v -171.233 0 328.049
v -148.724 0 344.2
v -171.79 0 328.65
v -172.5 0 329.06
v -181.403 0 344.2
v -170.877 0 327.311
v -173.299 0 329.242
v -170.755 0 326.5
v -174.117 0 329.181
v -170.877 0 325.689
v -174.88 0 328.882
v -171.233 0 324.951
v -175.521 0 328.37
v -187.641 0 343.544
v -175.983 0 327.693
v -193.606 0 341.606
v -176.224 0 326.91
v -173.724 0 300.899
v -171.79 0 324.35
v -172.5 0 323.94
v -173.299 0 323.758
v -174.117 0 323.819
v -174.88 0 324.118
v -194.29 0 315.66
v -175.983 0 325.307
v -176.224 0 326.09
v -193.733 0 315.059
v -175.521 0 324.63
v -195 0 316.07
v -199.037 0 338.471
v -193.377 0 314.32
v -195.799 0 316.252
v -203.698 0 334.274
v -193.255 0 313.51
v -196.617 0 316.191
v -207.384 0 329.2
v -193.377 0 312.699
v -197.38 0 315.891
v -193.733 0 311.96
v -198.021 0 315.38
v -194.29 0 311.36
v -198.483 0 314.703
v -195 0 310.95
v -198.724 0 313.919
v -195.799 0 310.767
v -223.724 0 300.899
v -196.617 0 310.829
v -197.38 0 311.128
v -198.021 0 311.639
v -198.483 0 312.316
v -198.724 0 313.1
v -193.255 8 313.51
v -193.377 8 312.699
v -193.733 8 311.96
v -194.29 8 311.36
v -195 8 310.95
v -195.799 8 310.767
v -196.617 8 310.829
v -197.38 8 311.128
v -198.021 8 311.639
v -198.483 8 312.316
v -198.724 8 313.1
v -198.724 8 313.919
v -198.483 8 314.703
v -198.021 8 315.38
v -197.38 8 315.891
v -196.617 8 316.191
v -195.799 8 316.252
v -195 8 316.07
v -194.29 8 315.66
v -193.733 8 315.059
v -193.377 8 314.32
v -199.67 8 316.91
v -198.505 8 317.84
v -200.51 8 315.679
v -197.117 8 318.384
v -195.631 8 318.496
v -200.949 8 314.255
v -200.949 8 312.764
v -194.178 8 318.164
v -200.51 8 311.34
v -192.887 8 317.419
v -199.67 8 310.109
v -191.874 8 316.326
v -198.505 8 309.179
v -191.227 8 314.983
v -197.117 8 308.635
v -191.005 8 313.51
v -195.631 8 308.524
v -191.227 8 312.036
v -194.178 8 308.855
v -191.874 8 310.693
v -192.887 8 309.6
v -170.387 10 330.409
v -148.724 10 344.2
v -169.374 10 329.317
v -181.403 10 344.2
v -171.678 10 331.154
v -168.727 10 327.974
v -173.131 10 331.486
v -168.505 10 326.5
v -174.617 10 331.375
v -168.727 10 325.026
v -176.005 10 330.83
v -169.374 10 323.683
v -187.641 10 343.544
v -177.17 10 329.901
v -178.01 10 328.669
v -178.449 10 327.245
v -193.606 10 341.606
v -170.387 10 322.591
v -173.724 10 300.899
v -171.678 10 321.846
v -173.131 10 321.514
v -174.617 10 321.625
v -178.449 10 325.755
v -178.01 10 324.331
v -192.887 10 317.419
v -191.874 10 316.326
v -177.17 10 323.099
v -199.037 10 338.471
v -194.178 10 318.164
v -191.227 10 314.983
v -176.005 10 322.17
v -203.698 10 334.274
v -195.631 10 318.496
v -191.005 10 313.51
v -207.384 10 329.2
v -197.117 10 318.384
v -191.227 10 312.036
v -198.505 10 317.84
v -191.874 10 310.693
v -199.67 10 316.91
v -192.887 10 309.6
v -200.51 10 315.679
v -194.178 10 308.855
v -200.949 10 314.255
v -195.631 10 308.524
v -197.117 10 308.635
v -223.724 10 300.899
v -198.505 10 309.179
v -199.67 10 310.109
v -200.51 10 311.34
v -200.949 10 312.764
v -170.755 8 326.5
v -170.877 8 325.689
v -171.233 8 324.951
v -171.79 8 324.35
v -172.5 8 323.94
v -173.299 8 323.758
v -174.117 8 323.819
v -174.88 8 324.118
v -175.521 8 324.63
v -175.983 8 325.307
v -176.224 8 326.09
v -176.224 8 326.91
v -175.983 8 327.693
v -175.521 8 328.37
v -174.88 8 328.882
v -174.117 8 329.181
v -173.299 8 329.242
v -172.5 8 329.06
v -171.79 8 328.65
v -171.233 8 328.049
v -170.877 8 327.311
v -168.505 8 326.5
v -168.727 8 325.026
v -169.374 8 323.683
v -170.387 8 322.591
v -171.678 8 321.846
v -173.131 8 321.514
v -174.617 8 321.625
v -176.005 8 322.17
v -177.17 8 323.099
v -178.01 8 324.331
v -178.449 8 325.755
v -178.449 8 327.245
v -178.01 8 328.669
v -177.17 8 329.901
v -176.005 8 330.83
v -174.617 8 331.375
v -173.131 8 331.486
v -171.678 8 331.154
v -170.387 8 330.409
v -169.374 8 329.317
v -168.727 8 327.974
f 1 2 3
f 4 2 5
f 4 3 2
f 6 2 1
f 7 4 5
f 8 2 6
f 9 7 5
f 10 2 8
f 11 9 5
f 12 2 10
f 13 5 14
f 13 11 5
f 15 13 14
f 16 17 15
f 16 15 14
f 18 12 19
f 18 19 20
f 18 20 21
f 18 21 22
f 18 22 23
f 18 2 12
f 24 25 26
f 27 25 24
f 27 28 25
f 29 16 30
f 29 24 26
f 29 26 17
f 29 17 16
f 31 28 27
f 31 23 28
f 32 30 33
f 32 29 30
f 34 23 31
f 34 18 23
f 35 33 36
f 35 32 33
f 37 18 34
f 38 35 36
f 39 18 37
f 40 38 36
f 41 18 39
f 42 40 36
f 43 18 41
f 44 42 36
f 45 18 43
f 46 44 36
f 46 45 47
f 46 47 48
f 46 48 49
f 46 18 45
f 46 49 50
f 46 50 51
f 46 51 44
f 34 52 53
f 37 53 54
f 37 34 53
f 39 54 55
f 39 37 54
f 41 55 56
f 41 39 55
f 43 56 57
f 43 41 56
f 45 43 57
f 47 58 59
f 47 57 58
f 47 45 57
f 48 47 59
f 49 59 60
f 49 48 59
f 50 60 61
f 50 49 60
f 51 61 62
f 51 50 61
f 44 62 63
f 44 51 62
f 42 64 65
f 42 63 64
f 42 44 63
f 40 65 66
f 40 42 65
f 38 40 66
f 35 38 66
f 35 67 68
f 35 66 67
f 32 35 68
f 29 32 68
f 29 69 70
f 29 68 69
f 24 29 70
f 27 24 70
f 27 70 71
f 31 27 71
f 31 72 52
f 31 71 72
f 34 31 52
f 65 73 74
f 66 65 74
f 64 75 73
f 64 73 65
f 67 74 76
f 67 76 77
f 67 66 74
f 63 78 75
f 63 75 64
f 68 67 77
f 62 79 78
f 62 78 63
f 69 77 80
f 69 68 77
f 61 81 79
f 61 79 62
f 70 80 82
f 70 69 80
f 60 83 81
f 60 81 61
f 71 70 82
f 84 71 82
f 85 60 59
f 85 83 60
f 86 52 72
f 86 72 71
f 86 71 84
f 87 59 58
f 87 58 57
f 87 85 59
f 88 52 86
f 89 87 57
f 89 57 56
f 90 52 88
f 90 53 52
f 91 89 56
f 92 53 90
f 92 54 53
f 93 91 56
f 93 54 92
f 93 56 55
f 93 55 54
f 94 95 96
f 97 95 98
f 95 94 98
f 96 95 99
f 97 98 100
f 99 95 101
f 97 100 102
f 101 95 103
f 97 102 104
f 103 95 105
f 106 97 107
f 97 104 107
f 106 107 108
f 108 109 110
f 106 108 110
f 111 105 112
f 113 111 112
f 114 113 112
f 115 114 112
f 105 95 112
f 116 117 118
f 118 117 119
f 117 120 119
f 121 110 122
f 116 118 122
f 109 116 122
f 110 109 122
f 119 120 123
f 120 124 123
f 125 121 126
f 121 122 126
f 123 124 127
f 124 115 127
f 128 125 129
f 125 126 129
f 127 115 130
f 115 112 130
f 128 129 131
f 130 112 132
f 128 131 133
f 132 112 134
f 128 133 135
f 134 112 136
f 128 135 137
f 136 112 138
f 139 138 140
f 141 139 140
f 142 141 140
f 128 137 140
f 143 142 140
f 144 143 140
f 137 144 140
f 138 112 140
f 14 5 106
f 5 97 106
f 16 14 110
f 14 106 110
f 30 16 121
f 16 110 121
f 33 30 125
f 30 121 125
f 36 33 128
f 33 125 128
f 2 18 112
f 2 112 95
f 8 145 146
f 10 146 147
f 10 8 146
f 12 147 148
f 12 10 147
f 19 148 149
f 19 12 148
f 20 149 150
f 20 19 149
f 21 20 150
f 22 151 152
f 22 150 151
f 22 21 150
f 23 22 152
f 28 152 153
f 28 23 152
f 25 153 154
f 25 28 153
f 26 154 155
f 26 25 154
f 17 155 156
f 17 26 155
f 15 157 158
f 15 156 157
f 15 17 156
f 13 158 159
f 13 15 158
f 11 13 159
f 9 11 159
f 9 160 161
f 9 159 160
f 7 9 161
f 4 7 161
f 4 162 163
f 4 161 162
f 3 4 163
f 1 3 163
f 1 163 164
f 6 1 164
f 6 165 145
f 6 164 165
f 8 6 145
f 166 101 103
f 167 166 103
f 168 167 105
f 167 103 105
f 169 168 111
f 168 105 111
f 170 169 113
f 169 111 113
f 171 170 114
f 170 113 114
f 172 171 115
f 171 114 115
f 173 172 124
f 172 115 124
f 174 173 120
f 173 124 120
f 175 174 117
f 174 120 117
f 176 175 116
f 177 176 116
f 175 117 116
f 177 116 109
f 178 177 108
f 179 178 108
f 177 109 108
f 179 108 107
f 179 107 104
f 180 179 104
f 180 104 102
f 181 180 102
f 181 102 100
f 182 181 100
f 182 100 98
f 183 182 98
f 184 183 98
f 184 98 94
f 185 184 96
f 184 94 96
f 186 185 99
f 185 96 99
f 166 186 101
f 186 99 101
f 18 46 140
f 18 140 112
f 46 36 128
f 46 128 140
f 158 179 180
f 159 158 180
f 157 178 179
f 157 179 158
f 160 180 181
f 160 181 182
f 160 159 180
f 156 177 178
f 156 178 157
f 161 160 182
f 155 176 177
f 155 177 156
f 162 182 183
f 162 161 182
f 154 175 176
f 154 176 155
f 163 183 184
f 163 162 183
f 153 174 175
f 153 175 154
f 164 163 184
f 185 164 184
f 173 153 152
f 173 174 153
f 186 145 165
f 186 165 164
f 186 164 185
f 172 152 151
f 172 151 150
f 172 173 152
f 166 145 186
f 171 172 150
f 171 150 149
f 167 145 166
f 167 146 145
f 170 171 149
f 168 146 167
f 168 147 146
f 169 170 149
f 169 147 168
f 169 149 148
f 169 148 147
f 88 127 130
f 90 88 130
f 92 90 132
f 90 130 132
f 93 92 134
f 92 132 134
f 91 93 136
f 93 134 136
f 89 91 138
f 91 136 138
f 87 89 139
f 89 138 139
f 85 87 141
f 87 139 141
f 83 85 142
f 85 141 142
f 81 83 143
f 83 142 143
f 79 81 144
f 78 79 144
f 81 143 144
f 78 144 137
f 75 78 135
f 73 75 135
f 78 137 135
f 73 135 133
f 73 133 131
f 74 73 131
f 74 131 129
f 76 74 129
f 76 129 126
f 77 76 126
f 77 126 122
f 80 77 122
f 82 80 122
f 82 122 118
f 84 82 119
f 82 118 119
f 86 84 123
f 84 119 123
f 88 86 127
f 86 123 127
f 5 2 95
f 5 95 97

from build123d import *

# Parameters (mm, degrees)
CROQUIS1_R              = 2.75
SALIENTE_EXTRUIR1_DEPTH = 10
CROQUIS2_R              = 5
CORTAR_EXTRUIR1_DEPTH   = 2
REDONDEO1_R             = 30


with BuildPart() as part:
    # Croquis1 → Saliente-Extruir1 (new body)
    with BuildSketch(Plane(origin=(0, 0, 0), x_dir=(1, 0, 0), z_dir=(0, 1, 0))):
        Polygon((-148.723962655, -344.2), (-198.723962655, -344.2), (-223.723962655, -300.898729811), (-173.723962655, -300.898729811), align=None)
        with Locations((-173.50486289, -326.5)):
            Circle(CROQUIS1_R, mode=Mode.SUBTRACT)
        with Locations((-196.00486289, -313.509618943)):
            Circle(CROQUIS1_R, mode=Mode.SUBTRACT)
    extrude(amount=SALIENTE_EXTRUIR1_DEPTH)

    # Croquis2 → Cortar-Extruir1 (cut)
    with BuildSketch(Plane(origin=(0, 10, 0), x_dir=(1, 0, 0), z_dir=(0, 1, 0))):
        with Locations((-196.00486289, -313.509618943)):
            Circle(CROQUIS2_R)
        with Locations((-173.50486289, -326.5)):
            Circle(CROQUIS2_R)
    extrude(amount=-CORTAR_EXTRUIR1_DEPTH, mode=Mode.SUBTRACT)

    # Redondeo1
    redondeo1_edges = [part.edges().sort_by_distance(p)[0] for p in [
        (-198.723962655, 5, 344.2),
    ]]
    fillet(redondeo1_edges, radius=REDONDEO1_R)


solid = part.part
